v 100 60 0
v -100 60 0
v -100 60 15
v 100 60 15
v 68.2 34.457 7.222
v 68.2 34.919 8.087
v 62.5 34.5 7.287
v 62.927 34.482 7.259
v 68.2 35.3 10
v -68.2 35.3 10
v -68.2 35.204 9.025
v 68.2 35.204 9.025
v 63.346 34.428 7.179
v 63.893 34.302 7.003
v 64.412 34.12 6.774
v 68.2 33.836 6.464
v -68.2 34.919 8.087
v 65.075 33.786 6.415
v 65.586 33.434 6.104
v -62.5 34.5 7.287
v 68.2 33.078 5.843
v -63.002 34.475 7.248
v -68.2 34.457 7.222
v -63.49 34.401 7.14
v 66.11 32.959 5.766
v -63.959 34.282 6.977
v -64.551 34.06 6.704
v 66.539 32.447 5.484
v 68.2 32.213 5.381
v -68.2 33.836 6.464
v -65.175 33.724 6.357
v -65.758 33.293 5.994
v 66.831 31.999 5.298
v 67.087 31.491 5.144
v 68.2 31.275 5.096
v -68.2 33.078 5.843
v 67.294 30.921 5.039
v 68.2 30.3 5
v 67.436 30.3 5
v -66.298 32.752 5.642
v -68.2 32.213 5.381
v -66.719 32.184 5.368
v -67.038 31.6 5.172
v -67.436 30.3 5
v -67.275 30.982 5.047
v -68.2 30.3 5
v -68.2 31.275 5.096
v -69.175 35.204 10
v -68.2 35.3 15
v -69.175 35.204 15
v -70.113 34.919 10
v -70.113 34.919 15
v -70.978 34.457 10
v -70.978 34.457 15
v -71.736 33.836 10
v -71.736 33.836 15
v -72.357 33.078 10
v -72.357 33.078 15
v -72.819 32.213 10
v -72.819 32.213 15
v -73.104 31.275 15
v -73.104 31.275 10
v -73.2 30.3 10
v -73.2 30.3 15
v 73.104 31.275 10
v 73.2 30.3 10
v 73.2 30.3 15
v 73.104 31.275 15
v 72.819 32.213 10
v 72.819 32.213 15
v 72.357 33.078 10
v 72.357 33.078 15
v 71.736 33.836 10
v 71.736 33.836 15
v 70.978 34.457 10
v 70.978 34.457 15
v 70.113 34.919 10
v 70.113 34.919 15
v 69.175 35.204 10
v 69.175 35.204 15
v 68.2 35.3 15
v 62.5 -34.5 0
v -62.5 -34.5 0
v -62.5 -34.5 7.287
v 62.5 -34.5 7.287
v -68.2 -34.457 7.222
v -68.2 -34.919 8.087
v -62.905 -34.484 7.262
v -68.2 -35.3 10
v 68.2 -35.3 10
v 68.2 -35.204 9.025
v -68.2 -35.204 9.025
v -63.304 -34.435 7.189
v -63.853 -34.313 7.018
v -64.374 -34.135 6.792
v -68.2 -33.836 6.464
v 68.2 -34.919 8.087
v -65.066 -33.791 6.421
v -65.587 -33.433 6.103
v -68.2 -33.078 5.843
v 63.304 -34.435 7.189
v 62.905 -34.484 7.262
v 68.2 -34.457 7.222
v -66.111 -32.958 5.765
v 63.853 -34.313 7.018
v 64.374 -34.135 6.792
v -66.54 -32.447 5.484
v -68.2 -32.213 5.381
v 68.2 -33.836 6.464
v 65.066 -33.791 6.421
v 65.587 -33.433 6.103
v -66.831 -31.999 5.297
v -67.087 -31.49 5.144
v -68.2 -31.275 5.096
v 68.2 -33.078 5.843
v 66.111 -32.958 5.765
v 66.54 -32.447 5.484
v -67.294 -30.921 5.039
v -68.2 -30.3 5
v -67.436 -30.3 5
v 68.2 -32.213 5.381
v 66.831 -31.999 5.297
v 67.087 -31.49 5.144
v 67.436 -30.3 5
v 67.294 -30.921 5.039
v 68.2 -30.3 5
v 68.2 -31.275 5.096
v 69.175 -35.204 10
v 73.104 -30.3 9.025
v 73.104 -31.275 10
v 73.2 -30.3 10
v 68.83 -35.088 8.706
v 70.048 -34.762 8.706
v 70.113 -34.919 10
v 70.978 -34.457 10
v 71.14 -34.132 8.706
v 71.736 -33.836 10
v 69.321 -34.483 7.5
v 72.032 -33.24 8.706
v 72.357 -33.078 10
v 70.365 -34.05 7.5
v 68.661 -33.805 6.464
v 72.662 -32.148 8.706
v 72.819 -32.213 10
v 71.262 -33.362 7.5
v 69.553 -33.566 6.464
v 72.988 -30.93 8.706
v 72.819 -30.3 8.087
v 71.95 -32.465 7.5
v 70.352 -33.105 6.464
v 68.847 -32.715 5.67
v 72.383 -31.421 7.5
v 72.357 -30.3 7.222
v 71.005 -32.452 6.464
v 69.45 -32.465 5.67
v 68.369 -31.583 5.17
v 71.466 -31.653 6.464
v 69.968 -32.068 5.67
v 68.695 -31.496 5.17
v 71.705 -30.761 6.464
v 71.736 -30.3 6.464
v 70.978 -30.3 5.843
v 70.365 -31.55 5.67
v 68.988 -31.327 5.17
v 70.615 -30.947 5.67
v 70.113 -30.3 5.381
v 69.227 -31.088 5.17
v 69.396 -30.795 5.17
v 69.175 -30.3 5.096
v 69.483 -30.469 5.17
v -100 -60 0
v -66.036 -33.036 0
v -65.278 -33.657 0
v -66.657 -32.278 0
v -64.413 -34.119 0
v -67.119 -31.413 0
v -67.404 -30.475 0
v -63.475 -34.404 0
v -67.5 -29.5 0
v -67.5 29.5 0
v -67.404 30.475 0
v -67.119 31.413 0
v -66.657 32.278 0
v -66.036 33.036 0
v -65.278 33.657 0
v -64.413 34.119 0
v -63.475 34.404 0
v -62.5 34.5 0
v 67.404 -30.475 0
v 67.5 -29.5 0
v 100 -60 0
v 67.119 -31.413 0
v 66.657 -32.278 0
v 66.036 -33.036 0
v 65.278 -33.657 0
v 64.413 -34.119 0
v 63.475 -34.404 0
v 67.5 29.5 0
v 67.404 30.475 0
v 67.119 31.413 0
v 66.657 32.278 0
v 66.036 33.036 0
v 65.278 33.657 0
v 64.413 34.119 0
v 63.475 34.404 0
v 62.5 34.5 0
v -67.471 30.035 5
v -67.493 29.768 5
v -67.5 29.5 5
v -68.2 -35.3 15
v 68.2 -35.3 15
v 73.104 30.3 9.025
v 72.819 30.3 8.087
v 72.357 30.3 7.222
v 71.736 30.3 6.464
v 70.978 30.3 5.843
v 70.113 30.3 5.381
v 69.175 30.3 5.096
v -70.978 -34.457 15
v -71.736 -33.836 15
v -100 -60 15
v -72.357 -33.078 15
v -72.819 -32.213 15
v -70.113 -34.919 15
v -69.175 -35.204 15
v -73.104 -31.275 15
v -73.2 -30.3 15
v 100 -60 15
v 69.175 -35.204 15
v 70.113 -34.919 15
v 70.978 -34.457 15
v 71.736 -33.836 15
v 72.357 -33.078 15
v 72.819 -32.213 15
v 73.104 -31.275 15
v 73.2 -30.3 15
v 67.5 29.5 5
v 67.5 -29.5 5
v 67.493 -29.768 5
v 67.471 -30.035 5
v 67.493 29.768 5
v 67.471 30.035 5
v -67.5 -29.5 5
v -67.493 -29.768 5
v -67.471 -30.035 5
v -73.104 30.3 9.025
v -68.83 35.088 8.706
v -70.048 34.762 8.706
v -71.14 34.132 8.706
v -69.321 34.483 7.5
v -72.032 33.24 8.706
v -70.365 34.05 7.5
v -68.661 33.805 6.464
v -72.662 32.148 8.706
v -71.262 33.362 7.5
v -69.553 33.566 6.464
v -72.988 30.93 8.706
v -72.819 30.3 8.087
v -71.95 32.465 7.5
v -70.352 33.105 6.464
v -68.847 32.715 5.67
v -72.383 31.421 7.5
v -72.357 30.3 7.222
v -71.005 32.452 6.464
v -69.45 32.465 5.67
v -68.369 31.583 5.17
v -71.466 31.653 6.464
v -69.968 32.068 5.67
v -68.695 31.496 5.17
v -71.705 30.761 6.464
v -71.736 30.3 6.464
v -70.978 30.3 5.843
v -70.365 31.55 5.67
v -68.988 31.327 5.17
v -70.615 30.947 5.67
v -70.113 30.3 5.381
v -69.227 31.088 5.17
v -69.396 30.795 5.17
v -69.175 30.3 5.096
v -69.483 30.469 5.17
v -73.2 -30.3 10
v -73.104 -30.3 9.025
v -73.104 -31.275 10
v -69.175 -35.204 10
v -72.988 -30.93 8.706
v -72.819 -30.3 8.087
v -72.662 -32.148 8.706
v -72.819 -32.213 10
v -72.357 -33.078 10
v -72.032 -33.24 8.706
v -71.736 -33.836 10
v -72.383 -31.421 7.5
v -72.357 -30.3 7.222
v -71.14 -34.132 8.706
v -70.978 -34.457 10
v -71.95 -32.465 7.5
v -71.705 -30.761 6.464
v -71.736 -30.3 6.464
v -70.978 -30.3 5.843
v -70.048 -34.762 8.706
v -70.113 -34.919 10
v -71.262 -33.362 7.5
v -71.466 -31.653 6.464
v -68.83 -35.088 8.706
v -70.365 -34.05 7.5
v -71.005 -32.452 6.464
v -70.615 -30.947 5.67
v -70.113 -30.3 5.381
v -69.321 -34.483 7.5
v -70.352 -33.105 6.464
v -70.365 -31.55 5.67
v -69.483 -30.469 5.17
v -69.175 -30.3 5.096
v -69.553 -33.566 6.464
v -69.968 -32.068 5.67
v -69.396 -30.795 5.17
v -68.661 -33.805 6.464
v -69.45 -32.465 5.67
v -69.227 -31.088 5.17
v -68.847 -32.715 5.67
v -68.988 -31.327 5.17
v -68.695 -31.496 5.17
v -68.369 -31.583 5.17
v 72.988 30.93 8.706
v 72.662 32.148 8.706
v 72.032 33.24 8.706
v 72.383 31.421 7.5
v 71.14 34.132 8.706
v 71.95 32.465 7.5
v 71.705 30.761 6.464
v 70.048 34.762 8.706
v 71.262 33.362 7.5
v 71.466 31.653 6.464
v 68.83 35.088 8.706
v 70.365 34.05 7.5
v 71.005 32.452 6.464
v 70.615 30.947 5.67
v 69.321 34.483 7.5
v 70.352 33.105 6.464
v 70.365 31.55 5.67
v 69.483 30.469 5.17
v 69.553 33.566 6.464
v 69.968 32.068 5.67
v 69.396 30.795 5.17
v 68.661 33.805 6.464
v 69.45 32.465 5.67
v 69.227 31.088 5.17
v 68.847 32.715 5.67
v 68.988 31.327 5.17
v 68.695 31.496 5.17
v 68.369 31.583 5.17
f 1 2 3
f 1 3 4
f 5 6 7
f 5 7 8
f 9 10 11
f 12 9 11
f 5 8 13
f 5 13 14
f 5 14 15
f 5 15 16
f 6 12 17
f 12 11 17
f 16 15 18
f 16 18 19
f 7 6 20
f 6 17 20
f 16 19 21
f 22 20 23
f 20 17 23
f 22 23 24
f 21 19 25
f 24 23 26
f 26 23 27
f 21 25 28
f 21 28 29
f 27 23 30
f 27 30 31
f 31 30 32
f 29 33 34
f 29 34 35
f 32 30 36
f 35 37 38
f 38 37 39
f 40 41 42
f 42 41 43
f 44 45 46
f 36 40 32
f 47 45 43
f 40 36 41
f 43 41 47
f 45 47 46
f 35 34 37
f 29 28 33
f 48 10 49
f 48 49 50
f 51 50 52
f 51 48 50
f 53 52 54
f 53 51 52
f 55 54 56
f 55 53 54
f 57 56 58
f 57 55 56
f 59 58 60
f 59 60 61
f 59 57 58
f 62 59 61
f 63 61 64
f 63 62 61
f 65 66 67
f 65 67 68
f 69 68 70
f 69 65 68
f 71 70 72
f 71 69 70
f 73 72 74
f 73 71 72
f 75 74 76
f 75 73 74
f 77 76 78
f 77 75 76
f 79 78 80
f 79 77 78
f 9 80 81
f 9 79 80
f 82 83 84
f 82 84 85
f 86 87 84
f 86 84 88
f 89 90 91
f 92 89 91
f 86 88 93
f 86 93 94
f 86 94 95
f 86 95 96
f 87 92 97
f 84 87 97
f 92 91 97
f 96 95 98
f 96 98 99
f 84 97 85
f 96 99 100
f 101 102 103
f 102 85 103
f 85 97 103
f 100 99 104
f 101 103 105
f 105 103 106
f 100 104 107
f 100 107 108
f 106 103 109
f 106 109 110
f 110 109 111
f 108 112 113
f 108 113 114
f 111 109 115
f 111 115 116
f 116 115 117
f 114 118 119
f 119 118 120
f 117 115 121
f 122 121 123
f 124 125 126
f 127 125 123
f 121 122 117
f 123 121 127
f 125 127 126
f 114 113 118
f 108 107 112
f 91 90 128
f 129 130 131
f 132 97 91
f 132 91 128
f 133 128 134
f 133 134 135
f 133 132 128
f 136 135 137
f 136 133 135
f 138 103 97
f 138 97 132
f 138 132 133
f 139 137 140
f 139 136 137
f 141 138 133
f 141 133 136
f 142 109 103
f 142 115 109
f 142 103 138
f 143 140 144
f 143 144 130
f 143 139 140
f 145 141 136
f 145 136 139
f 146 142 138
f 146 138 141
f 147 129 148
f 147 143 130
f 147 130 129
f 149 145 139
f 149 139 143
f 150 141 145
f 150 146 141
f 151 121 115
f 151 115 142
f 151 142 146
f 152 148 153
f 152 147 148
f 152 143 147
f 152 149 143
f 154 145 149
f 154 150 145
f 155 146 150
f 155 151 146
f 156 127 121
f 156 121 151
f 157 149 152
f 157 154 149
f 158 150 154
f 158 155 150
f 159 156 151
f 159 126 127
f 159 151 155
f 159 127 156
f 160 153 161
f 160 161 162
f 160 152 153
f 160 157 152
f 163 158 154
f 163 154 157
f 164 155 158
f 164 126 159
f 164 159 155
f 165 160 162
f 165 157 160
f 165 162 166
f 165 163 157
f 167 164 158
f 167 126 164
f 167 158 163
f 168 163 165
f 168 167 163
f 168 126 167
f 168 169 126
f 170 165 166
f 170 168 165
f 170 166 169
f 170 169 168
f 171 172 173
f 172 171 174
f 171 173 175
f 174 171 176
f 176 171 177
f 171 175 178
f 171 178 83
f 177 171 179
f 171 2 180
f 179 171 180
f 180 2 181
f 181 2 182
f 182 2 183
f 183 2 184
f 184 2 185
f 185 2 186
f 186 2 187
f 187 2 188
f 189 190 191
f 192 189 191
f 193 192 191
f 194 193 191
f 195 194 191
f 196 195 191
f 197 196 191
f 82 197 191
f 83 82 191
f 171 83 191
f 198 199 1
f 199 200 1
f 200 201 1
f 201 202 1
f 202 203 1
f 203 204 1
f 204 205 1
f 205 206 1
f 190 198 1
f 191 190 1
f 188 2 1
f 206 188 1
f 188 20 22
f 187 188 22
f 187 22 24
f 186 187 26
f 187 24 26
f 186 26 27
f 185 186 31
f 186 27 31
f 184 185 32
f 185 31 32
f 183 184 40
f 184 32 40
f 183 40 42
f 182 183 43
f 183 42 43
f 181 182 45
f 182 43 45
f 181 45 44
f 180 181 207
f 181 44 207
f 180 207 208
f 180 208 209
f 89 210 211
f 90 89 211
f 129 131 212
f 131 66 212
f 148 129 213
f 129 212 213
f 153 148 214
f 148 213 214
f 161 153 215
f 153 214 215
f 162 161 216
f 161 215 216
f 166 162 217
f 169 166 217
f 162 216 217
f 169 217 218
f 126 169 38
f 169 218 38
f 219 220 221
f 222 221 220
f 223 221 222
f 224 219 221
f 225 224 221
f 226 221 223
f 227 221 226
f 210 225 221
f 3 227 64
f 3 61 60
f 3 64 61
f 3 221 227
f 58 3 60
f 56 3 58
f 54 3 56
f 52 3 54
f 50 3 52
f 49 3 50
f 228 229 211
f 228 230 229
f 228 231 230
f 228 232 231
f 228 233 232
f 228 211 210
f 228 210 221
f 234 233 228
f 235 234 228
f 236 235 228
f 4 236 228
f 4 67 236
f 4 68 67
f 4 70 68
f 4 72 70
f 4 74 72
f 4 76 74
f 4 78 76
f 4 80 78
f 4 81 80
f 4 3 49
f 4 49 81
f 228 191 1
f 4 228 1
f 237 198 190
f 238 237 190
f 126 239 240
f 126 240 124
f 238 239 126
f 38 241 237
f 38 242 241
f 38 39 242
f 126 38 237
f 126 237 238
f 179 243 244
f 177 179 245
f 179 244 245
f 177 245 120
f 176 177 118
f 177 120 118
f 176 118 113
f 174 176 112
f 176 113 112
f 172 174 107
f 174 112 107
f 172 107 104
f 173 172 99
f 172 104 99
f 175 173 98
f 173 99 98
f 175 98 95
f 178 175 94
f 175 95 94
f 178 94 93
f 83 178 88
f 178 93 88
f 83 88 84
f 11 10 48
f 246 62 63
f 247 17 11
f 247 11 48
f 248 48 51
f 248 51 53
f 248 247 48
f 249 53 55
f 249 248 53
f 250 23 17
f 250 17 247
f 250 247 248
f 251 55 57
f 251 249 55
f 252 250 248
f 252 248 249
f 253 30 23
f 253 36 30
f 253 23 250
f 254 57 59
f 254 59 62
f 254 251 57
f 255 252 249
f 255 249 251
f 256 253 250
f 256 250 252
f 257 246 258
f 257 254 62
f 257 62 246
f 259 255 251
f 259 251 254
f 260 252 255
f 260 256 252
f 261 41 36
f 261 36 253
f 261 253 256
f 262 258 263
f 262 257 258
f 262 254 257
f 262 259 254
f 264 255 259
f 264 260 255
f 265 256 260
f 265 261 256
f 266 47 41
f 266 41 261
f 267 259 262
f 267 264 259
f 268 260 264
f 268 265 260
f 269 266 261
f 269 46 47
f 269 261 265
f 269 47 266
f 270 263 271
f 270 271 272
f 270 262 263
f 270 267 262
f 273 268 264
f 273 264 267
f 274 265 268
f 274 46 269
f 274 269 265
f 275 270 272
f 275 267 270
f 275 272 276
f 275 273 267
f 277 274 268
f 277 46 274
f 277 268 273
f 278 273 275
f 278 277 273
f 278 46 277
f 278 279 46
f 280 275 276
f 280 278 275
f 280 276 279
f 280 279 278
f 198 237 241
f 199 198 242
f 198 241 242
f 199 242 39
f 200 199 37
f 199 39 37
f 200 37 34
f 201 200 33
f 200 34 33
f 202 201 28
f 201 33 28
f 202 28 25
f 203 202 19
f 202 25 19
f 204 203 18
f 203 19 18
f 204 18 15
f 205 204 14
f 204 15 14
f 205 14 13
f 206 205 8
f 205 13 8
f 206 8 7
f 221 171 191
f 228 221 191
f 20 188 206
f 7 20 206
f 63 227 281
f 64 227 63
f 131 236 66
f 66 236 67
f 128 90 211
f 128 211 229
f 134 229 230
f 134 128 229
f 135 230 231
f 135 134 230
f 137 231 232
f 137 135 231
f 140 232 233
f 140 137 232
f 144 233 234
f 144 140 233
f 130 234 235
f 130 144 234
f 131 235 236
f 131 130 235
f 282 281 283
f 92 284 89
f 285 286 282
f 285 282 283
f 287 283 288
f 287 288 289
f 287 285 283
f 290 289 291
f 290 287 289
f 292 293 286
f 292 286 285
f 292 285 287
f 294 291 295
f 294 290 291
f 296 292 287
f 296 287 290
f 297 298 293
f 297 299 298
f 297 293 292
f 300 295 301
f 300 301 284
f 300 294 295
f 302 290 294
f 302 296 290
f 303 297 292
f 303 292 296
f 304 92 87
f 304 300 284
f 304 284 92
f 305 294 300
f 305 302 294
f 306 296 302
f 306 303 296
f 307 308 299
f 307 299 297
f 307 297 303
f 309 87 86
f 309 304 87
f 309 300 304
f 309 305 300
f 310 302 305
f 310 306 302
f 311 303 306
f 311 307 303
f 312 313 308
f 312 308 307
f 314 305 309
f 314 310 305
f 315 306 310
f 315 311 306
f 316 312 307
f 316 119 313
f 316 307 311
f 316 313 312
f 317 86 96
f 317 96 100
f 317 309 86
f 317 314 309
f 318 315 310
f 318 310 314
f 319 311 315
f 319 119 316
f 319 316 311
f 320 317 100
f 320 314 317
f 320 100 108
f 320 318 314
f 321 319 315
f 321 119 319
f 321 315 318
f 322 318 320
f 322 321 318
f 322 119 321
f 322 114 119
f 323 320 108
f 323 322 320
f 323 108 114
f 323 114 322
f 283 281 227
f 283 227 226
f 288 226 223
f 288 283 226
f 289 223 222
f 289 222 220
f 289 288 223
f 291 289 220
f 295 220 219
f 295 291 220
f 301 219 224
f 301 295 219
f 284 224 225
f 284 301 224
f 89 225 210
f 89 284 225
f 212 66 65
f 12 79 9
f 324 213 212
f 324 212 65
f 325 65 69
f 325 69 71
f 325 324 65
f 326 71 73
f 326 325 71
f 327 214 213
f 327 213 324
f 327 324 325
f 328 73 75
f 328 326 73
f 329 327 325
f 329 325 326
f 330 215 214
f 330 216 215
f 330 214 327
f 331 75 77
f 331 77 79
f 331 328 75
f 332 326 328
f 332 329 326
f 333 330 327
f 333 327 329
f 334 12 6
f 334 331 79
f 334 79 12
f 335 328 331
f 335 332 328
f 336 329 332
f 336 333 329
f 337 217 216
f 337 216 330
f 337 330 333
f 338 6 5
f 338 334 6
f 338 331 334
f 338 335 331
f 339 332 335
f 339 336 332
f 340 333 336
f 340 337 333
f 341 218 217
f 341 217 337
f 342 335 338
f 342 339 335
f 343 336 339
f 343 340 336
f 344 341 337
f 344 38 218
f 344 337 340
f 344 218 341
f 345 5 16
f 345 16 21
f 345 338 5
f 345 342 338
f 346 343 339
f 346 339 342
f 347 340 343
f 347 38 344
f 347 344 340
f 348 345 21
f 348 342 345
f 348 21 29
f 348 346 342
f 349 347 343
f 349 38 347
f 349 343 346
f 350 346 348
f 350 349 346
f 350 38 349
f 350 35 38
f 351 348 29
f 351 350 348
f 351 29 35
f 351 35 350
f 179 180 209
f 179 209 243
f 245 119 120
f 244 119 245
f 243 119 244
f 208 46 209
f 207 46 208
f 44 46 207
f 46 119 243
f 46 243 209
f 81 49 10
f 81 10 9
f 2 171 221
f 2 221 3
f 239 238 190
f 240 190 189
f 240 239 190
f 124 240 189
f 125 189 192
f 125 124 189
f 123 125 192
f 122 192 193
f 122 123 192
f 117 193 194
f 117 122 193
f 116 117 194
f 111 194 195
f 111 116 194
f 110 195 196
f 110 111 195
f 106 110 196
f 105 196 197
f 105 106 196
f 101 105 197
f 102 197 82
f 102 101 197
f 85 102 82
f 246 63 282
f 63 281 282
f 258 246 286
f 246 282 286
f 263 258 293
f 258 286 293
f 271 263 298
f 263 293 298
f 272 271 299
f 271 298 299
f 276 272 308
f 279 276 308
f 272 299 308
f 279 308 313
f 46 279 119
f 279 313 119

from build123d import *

# Parameters (mm, degrees)
F0_W      = 200
F0_H      = 120
F1_DEPTH  = 15
F2_W      = 146.4
F2_H      = 70.6
F3_DEPTH  = 10
F4_R      = 5
F5_R      = 5
F6_R      = 5
F7_R      = 5
F8_R      = 5
F9_W      = 135
F9_H      = 69
F10_DEPTH = 25
F11_R     = 5
F12_R     = 5
F13_R     = 5
F14_R     = 5


with BuildPart() as f1:
    # F0 (on Top) → F1 (new body)
    with BuildSketch(Plane.XY):
        Rectangle(F0_W, F0_H)
    extrude(amount=F1_DEPTH)

    # F2 (on face) → F3 (cut)
    with BuildSketch(Plane.XY.offset(15)):
        Rectangle(F2_W, F2_H)
    extrude(amount=-F3_DEPTH, mode=Mode.SUBTRACT)

    # F4
    f4_edges = [f1.edges().sort_by_distance(p)[0] for p in [
        (-73.2, 35.3, 10),
    ]]
    fillet(f4_edges, radius=F4_R)

    # F5
    f5_edges = [f1.edges().sort_by_distance(p)[0] for p in [
        (-73.2, -35.3, 10),
    ]]
    fillet(f5_edges, radius=F5_R)

    # F6
    f6_edges = [f1.edges().sort_by_distance(p)[0] for p in [
        (73.2, -35.3, 10),
    ]]
    fillet(f6_edges, radius=F6_R)

    # F7
    f7_edges = [f1.edges().sort_by_distance(p)[0] for p in [
        (73.2, 35.3, 10),
    ]]
    fillet(f7_edges, radius=F7_R)

    # F8
    f8_edges = [f1.edges().sort_by_distance(p)[0] for p in [
        (73.2, 0, 5),
        (0, 35.3, 5),
        (0, -35.3, 5),
        (-73.2, 0, 5),
    ]]
    fillet(f8_edges, radius=F8_R)

    # F9 (on face) → F10 (cut)
    with BuildSketch(Plane(origin=(0, 0, 0), x_dir=(1, 0, 0), z_dir=(0, 0, -1))):
        Rectangle(F9_W, F9_H)
    extrude(amount=-F10_DEPTH, mode=Mode.SUBTRACT)

    # F11
    f11_edges = [f1.edges().sort_by_distance(p)[0] for p in [
        (67.5, -34.5, 3.643534),
    ]]
    fillet(f11_edges, radius=F11_R)

    # F12
    f12_edges = [f1.edges().sort_by_distance(p)[0] for p in [
        (67.5, 34.5, 3.643534),
    ]]
    fillet(f12_edges, radius=F12_R)

    # F13
    f13_edges = [f1.edges().sort_by_distance(p)[0] for p in [
        (-67.5, 34.5, 3.643534),
    ]]
    fillet(f13_edges, radius=F13_R)

    # F14
    f14_edges = [f1.edges().sort_by_distance(p)[0] for p in [
        (-67.5, -34.5, 3.643534),
    ]]
    fillet(f14_edges, radius=F14_R)


solid = f1.part
